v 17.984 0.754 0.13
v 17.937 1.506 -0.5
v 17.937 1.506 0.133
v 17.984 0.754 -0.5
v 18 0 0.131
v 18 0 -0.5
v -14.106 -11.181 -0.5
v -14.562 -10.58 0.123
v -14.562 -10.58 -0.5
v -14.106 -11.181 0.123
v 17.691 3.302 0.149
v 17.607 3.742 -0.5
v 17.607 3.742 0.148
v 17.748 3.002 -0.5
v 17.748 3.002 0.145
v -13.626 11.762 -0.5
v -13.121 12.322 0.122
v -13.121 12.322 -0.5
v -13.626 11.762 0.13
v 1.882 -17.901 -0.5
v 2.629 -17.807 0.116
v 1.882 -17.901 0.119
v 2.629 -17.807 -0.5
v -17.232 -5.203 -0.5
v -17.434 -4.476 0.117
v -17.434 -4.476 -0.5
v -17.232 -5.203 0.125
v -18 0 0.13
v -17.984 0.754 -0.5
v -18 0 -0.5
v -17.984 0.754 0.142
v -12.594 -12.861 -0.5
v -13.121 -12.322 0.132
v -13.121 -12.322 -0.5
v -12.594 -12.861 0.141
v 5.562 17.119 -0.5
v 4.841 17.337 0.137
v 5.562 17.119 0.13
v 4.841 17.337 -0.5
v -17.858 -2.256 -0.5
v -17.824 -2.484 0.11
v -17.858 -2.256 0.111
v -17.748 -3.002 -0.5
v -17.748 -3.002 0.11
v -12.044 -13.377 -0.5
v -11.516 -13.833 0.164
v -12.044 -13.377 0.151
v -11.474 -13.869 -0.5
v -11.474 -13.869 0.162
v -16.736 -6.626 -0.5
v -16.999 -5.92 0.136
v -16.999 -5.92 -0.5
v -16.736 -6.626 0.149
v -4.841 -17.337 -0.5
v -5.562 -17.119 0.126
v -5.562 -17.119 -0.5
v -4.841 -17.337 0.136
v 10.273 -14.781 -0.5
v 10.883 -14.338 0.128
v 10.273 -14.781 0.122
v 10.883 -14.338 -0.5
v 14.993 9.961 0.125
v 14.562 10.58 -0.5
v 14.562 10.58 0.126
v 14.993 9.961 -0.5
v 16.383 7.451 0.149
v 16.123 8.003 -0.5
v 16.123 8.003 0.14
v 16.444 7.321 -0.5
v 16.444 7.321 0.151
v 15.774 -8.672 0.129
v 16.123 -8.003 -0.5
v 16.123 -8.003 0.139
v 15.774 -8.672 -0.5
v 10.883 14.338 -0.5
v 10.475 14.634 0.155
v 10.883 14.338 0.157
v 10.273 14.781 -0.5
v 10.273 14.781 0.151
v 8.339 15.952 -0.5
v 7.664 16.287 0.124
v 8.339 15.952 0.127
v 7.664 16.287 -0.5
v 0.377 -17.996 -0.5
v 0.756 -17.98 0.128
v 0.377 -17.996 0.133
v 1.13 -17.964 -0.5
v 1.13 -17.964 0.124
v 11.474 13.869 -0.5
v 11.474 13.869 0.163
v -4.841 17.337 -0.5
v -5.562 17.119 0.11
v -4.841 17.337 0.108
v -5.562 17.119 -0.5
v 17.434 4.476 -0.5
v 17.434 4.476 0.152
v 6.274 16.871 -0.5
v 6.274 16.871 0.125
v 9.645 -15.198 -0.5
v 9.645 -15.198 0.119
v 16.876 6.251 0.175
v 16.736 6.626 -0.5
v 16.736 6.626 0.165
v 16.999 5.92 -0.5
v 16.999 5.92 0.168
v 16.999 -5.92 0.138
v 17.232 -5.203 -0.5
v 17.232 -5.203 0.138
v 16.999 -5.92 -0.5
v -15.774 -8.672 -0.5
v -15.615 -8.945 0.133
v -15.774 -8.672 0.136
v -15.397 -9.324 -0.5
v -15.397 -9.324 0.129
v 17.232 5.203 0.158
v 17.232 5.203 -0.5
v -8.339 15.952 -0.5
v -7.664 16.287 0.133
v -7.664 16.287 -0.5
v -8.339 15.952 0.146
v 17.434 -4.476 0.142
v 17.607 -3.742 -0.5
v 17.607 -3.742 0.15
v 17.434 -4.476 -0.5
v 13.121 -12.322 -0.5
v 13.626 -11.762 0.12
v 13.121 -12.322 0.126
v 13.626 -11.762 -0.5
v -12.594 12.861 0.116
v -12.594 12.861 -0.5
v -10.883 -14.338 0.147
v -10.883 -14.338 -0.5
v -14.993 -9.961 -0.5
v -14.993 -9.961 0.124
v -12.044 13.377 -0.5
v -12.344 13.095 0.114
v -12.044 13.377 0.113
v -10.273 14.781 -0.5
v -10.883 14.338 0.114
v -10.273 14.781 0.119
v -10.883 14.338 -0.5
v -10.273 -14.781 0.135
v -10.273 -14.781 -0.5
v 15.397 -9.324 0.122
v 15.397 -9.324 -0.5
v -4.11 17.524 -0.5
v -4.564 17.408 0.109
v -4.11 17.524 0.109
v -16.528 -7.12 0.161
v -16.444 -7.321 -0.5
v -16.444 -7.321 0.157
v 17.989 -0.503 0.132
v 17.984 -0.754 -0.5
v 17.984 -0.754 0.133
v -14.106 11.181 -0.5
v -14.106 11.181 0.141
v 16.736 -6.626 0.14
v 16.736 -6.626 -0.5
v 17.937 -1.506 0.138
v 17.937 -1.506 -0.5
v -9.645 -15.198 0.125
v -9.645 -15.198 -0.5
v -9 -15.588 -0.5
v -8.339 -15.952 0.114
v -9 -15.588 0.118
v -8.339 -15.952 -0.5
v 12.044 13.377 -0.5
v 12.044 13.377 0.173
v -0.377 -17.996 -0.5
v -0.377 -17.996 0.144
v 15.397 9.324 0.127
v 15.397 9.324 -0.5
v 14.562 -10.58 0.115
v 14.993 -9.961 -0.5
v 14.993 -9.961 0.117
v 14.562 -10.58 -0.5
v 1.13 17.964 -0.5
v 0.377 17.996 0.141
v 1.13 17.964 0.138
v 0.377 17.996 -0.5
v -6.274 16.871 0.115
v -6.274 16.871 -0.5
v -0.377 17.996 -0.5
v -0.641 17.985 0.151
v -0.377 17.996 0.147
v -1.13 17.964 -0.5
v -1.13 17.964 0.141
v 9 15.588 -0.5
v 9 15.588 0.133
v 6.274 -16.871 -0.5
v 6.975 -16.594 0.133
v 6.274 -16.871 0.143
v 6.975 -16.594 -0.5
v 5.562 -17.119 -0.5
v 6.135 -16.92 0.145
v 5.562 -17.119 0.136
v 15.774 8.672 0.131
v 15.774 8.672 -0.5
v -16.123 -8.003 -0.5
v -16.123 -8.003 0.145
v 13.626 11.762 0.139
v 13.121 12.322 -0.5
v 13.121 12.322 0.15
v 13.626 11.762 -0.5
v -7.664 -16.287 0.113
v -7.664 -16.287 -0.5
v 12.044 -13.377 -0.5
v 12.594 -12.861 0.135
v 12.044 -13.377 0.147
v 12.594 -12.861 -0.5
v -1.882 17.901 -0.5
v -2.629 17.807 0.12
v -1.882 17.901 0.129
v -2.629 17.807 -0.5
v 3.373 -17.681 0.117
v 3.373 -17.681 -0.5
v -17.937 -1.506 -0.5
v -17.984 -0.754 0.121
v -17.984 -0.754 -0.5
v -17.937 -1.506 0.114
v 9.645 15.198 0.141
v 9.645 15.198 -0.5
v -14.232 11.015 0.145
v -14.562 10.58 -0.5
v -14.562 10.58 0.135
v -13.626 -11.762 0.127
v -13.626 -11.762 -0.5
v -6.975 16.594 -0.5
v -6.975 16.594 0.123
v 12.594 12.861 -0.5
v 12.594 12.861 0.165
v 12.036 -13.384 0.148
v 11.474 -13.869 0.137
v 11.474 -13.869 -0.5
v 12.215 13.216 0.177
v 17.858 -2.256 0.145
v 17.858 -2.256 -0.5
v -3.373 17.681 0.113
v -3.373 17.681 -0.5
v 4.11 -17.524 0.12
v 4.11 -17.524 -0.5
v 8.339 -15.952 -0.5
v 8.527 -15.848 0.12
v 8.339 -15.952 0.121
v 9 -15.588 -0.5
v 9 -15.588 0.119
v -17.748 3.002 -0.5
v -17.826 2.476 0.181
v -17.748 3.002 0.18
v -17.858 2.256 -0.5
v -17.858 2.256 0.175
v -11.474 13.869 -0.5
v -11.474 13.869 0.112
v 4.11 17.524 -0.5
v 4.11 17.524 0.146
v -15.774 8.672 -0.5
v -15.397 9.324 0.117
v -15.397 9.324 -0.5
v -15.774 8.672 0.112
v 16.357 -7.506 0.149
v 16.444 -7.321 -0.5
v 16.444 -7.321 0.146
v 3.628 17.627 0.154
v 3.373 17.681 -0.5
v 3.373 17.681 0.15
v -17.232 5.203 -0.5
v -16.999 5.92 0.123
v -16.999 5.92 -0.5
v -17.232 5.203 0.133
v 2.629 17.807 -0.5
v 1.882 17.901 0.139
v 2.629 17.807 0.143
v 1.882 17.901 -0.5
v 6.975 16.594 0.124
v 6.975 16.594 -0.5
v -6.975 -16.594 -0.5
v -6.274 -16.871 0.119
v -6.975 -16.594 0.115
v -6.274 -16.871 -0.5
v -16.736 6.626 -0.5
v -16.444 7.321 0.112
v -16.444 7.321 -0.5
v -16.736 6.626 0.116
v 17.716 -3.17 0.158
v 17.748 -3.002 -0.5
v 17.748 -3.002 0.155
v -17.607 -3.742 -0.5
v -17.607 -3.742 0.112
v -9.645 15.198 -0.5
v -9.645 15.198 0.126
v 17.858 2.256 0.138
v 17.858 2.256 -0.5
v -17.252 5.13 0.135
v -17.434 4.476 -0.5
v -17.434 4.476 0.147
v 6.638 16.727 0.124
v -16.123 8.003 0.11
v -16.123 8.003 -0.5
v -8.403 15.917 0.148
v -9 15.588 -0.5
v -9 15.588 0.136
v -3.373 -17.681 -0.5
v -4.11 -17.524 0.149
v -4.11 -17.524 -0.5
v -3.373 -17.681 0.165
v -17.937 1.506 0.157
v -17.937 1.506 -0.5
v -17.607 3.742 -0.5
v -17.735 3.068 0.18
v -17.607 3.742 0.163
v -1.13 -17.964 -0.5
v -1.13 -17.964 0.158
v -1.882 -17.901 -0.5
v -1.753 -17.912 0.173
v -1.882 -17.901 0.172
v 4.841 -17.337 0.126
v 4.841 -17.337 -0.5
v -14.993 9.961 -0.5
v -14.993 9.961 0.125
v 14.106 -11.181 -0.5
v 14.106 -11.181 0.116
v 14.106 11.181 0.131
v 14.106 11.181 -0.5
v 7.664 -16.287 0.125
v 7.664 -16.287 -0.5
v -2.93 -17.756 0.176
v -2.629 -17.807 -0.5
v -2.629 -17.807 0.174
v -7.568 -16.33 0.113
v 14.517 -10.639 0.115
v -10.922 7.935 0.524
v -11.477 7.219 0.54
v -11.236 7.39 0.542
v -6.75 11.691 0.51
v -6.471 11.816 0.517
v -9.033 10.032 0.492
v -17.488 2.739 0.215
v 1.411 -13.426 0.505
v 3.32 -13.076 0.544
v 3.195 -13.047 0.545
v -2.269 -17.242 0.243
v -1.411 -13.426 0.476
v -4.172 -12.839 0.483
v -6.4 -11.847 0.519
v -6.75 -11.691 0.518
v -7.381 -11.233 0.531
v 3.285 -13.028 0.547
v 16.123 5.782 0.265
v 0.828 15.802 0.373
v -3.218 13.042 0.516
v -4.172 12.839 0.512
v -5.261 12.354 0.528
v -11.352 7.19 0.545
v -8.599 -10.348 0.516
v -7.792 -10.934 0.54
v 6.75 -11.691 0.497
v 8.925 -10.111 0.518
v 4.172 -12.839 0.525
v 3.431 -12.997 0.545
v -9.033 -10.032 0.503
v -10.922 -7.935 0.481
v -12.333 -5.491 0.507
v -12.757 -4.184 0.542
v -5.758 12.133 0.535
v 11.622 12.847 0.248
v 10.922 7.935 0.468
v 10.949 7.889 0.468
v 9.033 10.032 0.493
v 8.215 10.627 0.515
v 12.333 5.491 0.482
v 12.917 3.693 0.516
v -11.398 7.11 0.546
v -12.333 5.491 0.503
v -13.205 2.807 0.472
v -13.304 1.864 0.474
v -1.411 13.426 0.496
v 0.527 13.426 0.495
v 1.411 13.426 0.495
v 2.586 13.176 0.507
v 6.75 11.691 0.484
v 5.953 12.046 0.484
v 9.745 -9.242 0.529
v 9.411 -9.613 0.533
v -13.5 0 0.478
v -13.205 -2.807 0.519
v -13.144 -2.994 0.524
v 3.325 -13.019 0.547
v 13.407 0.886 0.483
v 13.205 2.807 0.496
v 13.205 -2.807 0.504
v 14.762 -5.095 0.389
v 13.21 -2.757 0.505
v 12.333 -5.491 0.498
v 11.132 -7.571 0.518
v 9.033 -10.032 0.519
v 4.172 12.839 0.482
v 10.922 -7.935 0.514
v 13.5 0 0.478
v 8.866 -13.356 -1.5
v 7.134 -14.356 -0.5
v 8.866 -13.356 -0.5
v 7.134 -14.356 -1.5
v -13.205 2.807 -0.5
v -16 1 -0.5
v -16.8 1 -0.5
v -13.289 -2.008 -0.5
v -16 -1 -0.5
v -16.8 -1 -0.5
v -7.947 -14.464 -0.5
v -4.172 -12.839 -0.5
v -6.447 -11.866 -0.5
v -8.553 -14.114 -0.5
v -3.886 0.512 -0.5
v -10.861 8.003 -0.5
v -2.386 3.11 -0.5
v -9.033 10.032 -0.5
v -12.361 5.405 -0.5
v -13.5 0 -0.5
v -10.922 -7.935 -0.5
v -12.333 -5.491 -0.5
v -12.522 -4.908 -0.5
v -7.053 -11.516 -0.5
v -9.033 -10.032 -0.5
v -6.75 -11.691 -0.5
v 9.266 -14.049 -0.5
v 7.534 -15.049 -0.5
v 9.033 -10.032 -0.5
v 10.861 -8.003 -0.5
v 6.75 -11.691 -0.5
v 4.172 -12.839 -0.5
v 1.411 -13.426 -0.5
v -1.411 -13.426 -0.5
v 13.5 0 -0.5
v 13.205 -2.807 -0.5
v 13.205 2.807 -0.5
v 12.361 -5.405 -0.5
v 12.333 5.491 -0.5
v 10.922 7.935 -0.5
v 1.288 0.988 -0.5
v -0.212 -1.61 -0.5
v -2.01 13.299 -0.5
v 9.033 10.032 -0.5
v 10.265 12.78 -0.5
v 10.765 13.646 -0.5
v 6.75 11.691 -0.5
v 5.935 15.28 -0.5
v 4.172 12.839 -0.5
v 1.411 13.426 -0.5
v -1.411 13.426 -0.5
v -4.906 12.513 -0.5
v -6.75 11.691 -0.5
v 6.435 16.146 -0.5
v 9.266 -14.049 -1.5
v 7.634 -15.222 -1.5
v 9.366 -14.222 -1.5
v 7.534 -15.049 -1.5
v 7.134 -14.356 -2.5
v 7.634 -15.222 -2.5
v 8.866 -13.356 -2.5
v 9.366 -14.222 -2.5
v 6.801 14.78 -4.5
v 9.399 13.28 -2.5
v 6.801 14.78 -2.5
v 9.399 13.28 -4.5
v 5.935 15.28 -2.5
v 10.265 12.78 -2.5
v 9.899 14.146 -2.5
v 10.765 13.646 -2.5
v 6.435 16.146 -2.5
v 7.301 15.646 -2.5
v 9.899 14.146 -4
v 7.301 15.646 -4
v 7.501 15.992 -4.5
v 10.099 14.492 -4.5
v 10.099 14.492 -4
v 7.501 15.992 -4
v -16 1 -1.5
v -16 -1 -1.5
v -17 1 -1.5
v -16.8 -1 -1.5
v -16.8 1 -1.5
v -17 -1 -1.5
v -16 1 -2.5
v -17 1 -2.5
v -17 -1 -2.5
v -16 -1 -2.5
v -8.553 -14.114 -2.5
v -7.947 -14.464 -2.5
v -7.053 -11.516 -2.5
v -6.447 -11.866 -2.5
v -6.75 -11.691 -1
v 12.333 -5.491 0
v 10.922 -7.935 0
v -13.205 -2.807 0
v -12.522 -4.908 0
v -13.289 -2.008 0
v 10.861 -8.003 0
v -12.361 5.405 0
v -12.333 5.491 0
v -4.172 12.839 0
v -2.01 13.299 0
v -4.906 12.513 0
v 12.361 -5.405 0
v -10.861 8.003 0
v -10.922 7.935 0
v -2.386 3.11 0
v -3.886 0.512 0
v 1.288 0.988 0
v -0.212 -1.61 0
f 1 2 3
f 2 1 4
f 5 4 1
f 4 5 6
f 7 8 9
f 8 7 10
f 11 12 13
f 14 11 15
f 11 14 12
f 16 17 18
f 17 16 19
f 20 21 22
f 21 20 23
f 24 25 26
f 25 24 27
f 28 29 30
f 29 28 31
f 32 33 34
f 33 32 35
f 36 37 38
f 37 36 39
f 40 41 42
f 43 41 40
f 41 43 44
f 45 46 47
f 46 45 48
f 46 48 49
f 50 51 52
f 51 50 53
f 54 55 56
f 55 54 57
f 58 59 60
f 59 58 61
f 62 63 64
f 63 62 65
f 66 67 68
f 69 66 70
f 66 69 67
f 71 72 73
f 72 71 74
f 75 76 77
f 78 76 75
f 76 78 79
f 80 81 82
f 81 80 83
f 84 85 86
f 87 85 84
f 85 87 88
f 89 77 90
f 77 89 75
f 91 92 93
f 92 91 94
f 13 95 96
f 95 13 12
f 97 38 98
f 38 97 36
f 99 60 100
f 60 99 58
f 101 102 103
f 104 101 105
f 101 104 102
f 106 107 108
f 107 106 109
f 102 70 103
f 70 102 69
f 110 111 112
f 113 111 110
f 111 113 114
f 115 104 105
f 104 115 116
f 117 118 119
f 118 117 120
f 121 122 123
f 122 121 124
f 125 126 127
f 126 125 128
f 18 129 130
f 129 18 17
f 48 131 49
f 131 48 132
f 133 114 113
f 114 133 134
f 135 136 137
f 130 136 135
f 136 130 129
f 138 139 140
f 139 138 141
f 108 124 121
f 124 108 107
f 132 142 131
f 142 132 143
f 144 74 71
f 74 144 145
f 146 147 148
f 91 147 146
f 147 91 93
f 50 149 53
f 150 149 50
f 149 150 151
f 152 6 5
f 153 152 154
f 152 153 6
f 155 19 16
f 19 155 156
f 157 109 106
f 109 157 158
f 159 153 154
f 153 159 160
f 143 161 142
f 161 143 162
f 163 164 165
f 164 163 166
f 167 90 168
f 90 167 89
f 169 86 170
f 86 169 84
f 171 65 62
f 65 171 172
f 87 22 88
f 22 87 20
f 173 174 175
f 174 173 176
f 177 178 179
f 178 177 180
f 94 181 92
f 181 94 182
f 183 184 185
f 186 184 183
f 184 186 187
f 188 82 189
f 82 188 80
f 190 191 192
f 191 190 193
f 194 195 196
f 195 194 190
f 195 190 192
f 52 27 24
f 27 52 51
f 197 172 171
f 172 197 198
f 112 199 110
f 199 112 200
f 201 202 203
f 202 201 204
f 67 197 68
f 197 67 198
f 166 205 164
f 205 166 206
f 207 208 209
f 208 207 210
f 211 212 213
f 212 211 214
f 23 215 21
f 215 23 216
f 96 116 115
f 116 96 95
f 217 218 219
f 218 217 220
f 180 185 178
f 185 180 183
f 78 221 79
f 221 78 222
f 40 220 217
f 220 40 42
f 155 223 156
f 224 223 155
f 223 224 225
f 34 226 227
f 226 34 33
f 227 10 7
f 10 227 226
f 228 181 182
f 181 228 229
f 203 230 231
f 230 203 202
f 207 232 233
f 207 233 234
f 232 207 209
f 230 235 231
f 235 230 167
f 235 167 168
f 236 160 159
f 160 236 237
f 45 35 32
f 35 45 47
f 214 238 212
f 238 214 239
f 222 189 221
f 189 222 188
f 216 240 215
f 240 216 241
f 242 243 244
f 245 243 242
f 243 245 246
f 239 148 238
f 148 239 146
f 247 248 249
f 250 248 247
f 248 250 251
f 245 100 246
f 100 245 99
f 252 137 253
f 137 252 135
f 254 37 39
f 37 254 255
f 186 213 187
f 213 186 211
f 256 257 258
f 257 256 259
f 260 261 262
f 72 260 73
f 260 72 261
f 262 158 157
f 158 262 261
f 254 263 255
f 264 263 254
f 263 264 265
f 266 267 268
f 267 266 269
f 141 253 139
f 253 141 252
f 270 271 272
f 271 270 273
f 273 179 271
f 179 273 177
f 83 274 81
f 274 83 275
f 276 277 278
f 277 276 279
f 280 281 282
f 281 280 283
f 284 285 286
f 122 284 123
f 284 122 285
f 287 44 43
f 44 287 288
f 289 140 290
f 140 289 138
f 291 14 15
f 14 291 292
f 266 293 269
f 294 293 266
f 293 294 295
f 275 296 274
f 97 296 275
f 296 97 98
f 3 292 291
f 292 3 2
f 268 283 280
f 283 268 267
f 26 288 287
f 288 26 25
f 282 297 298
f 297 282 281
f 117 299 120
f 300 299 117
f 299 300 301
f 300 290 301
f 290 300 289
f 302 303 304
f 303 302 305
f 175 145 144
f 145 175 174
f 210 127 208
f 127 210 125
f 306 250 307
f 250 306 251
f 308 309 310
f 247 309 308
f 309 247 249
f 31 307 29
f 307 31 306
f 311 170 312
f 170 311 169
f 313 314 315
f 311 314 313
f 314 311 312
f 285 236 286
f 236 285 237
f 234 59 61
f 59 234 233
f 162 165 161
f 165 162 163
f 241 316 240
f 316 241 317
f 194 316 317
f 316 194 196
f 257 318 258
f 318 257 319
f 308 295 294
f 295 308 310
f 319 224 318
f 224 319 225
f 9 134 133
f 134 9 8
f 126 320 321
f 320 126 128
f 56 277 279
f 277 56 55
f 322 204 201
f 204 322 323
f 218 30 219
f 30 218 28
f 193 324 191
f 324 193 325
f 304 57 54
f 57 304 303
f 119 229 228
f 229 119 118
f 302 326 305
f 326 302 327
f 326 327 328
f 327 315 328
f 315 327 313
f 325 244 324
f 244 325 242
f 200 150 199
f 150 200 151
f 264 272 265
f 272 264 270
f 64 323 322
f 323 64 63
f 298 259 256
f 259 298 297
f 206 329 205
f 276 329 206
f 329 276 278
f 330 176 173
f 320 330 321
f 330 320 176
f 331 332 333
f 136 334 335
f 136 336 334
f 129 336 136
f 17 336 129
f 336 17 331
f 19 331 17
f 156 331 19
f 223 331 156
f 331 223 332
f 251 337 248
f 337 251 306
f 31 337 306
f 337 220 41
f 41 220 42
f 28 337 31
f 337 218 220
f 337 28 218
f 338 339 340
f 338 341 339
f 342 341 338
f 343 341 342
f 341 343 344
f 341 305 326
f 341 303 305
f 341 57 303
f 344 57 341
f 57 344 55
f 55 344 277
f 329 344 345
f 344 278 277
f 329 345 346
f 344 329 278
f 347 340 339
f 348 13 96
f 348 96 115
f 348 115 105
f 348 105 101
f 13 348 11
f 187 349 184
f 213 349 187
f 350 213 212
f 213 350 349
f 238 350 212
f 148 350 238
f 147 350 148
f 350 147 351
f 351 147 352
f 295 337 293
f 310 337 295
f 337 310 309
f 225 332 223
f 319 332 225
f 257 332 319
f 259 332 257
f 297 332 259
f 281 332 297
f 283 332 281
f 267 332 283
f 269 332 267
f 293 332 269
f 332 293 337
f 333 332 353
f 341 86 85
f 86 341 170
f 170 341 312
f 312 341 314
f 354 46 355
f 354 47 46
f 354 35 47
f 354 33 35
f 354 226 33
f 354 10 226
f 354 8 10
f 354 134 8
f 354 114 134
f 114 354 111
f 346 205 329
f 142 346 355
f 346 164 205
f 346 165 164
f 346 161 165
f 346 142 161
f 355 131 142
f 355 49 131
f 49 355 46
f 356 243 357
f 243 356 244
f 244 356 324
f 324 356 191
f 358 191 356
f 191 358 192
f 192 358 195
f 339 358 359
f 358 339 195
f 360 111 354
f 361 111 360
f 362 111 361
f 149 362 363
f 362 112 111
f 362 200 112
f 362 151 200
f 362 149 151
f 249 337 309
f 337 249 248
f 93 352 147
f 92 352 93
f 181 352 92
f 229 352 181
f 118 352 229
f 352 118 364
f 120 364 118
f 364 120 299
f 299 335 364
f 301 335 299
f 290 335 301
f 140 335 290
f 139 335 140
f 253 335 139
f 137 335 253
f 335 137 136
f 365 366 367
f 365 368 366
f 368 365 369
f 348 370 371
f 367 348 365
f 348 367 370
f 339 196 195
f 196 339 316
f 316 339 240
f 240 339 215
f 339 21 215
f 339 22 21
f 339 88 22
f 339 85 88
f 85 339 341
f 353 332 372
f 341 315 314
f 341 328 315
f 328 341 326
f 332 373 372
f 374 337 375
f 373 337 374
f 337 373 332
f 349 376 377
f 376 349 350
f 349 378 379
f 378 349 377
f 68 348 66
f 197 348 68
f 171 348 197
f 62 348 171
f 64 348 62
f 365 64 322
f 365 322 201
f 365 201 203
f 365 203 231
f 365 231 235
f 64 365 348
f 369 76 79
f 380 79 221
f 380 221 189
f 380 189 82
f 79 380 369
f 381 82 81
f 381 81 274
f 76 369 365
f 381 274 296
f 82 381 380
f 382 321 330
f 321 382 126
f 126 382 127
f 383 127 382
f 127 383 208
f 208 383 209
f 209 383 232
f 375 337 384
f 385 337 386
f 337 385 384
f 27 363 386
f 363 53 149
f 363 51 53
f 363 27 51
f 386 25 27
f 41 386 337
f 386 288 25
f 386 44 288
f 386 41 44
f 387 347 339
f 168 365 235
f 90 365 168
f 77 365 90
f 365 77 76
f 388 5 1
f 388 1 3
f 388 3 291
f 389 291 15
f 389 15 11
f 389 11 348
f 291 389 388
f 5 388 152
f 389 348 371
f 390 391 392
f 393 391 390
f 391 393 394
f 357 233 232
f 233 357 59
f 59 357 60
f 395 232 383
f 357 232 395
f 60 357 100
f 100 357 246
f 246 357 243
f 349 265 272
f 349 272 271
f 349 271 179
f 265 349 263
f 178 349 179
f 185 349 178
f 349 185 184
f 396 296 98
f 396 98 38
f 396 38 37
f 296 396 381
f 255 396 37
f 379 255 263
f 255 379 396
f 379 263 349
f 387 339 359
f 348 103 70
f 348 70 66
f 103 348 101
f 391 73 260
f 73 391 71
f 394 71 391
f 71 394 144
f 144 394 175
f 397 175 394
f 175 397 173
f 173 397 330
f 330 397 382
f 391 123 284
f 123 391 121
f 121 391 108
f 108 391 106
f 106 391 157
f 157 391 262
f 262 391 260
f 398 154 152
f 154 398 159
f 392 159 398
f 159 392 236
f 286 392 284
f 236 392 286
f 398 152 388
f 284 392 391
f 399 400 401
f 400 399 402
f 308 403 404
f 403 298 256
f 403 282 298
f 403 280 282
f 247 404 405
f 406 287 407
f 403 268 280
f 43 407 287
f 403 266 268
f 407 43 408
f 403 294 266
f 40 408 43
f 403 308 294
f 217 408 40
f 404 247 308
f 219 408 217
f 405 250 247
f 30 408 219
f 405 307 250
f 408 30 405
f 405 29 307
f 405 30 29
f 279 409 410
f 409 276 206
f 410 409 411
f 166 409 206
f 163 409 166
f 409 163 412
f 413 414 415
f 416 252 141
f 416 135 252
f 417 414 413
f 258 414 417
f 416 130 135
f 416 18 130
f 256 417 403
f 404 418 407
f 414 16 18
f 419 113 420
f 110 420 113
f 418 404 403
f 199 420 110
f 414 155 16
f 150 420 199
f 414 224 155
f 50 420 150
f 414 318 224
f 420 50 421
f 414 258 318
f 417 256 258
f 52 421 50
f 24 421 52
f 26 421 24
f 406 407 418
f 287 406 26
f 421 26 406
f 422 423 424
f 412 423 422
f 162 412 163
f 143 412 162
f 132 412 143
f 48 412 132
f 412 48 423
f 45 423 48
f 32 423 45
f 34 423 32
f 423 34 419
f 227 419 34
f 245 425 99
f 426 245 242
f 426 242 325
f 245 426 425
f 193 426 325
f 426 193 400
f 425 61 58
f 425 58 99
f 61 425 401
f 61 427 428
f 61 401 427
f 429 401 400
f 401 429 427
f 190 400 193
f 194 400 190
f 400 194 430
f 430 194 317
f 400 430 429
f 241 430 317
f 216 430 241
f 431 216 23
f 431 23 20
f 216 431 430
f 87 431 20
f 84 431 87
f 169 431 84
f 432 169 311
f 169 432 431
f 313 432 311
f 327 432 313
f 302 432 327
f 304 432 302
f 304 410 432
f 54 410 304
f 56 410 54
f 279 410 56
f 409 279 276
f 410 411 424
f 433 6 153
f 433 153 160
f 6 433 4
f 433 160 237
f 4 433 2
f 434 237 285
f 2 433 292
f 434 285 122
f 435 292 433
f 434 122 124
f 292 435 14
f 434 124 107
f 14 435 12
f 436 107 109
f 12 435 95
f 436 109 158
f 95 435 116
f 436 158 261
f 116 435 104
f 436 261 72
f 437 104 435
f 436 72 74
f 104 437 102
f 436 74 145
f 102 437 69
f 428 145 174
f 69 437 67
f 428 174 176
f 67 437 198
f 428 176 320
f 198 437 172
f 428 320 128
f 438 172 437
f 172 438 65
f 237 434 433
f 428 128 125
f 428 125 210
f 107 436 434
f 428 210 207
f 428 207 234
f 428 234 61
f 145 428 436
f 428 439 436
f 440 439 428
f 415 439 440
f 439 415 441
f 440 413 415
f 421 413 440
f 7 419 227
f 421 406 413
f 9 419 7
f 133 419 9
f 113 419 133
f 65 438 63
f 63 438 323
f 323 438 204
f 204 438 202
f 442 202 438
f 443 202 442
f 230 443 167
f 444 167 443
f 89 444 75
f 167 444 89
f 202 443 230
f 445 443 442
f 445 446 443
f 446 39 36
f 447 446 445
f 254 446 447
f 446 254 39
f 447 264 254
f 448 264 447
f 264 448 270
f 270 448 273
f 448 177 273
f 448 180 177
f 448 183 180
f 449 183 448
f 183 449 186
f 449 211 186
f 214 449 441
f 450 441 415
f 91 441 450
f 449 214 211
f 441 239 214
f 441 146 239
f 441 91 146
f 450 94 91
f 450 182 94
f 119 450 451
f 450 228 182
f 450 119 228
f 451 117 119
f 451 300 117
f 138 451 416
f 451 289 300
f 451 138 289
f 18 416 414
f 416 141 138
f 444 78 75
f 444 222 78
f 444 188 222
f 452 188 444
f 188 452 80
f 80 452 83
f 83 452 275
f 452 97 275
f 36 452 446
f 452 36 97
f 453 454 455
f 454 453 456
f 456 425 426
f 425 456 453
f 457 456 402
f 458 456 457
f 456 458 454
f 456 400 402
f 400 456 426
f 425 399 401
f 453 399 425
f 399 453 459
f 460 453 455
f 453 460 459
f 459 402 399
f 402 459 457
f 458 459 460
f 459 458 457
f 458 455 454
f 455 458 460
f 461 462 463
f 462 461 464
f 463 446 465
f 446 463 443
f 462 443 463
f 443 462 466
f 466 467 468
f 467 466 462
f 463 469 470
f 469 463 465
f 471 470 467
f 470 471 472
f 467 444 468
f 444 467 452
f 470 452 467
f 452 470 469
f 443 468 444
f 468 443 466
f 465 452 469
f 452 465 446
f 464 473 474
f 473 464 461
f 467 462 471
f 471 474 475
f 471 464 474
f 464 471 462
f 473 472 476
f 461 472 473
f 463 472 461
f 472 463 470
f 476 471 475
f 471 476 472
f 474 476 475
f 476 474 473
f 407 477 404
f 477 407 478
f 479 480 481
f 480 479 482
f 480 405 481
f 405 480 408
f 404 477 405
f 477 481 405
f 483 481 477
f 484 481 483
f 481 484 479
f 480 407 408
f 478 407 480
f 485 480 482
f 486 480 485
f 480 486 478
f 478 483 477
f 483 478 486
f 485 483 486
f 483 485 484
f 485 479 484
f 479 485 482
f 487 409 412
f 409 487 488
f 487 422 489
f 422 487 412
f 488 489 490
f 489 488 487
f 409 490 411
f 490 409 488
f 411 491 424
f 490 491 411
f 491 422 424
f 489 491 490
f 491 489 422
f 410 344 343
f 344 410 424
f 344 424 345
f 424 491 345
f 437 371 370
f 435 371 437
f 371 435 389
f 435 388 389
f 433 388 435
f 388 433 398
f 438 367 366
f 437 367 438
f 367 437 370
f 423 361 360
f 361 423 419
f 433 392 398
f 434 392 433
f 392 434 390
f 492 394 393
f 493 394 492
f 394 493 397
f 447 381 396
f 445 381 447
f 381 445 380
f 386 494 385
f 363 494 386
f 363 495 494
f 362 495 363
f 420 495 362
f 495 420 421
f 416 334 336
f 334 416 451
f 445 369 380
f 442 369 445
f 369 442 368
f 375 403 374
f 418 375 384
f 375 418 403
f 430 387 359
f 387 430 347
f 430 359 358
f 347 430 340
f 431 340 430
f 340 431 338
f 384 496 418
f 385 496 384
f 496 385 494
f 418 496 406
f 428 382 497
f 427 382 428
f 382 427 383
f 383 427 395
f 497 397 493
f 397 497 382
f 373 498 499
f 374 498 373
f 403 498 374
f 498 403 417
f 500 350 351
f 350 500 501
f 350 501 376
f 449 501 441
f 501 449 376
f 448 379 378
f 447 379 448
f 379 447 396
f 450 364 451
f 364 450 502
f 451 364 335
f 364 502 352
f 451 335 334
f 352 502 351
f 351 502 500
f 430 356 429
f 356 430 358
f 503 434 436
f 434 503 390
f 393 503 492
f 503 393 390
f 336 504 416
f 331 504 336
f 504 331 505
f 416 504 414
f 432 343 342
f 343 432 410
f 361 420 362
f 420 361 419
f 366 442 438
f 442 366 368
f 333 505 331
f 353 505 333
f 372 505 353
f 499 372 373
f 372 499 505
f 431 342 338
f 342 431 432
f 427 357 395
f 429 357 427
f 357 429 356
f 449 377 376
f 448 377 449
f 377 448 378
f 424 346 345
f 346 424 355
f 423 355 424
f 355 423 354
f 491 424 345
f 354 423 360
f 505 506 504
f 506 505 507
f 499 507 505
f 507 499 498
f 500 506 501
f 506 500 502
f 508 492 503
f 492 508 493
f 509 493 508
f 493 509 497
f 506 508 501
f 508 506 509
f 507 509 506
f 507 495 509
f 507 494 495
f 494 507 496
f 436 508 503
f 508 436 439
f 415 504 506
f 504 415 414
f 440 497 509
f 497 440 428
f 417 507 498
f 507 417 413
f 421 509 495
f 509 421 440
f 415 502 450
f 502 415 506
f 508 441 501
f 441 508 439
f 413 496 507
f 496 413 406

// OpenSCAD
difference(){
    ear();
    translate([0,0,-1]) cylinder(h=3,d=27);
}
width = 3;
rotate([0,0,360/6]){
rotate([0,0,-90])
translate([-width/2,-width/2,-0.5])cube([36/2,width,0.5]);

rotate([0,0,45])
translate([-width/2,-width/2,-0.5])cube([36/2,width,0.5]);

rotate([0,0,90])
translate([-width/2,-width/2,-0.5])cube([36/2,width,0.5]);

rotate([0,0,135])
translate([-width/2,-width/2,-0.5])cube([36/2,width,0.5]);
}


module arc180(angle, radius, width) {
    difference(){
        circle(radius+width/2);
        circle(radius-width/2);
        
        translate([radius*1.5,0,0])
        square(radius*3,center = true);
        
        rotate([0,0,180-angle])
        translate([radius*1.5,0,0])
        square(radius*3,center = true);        
        
    }
}

module ear(){
    
    $fn=150;
    sphere_size=200;
    intersection(){
        cylinder(h=1,d=36);
        translate([0,0,-sphere_size+1])
        rotate([45,45,0])
        sphere(sphere_size);
    }
    translate([0,0,-0.5])cylinder(h=0.5,d=36);

    translate([-36/2+1.6,0,-1])cube([0.8,2,1], true);
    translate([-36/2+1.5,0,-2])cube([1,2,1], true);

    rotate([0,0,360/3]){
        translate([-36/2+1.6,0,-1])cube([0.8,2,1], true);
        translate([-36/2+1.5,0,-2])cube([1,2,1], true);
    }

    rotate([0,0,360/6]){
        translate([-36/2+3,0,-1.5])cube([3,0.7,2], true);
    }

    rotate([0,0,360/6+180]){
        translate([-36/2+1.3,0,-1.5])cube([1,5,2], true);
        translate([-36/2+1.3,0,-3.5])cube([1,3,2], true);
        translate([-36/2+1,0,-4.25])cube([1.2,3,0.5], true);
        
    }
}
